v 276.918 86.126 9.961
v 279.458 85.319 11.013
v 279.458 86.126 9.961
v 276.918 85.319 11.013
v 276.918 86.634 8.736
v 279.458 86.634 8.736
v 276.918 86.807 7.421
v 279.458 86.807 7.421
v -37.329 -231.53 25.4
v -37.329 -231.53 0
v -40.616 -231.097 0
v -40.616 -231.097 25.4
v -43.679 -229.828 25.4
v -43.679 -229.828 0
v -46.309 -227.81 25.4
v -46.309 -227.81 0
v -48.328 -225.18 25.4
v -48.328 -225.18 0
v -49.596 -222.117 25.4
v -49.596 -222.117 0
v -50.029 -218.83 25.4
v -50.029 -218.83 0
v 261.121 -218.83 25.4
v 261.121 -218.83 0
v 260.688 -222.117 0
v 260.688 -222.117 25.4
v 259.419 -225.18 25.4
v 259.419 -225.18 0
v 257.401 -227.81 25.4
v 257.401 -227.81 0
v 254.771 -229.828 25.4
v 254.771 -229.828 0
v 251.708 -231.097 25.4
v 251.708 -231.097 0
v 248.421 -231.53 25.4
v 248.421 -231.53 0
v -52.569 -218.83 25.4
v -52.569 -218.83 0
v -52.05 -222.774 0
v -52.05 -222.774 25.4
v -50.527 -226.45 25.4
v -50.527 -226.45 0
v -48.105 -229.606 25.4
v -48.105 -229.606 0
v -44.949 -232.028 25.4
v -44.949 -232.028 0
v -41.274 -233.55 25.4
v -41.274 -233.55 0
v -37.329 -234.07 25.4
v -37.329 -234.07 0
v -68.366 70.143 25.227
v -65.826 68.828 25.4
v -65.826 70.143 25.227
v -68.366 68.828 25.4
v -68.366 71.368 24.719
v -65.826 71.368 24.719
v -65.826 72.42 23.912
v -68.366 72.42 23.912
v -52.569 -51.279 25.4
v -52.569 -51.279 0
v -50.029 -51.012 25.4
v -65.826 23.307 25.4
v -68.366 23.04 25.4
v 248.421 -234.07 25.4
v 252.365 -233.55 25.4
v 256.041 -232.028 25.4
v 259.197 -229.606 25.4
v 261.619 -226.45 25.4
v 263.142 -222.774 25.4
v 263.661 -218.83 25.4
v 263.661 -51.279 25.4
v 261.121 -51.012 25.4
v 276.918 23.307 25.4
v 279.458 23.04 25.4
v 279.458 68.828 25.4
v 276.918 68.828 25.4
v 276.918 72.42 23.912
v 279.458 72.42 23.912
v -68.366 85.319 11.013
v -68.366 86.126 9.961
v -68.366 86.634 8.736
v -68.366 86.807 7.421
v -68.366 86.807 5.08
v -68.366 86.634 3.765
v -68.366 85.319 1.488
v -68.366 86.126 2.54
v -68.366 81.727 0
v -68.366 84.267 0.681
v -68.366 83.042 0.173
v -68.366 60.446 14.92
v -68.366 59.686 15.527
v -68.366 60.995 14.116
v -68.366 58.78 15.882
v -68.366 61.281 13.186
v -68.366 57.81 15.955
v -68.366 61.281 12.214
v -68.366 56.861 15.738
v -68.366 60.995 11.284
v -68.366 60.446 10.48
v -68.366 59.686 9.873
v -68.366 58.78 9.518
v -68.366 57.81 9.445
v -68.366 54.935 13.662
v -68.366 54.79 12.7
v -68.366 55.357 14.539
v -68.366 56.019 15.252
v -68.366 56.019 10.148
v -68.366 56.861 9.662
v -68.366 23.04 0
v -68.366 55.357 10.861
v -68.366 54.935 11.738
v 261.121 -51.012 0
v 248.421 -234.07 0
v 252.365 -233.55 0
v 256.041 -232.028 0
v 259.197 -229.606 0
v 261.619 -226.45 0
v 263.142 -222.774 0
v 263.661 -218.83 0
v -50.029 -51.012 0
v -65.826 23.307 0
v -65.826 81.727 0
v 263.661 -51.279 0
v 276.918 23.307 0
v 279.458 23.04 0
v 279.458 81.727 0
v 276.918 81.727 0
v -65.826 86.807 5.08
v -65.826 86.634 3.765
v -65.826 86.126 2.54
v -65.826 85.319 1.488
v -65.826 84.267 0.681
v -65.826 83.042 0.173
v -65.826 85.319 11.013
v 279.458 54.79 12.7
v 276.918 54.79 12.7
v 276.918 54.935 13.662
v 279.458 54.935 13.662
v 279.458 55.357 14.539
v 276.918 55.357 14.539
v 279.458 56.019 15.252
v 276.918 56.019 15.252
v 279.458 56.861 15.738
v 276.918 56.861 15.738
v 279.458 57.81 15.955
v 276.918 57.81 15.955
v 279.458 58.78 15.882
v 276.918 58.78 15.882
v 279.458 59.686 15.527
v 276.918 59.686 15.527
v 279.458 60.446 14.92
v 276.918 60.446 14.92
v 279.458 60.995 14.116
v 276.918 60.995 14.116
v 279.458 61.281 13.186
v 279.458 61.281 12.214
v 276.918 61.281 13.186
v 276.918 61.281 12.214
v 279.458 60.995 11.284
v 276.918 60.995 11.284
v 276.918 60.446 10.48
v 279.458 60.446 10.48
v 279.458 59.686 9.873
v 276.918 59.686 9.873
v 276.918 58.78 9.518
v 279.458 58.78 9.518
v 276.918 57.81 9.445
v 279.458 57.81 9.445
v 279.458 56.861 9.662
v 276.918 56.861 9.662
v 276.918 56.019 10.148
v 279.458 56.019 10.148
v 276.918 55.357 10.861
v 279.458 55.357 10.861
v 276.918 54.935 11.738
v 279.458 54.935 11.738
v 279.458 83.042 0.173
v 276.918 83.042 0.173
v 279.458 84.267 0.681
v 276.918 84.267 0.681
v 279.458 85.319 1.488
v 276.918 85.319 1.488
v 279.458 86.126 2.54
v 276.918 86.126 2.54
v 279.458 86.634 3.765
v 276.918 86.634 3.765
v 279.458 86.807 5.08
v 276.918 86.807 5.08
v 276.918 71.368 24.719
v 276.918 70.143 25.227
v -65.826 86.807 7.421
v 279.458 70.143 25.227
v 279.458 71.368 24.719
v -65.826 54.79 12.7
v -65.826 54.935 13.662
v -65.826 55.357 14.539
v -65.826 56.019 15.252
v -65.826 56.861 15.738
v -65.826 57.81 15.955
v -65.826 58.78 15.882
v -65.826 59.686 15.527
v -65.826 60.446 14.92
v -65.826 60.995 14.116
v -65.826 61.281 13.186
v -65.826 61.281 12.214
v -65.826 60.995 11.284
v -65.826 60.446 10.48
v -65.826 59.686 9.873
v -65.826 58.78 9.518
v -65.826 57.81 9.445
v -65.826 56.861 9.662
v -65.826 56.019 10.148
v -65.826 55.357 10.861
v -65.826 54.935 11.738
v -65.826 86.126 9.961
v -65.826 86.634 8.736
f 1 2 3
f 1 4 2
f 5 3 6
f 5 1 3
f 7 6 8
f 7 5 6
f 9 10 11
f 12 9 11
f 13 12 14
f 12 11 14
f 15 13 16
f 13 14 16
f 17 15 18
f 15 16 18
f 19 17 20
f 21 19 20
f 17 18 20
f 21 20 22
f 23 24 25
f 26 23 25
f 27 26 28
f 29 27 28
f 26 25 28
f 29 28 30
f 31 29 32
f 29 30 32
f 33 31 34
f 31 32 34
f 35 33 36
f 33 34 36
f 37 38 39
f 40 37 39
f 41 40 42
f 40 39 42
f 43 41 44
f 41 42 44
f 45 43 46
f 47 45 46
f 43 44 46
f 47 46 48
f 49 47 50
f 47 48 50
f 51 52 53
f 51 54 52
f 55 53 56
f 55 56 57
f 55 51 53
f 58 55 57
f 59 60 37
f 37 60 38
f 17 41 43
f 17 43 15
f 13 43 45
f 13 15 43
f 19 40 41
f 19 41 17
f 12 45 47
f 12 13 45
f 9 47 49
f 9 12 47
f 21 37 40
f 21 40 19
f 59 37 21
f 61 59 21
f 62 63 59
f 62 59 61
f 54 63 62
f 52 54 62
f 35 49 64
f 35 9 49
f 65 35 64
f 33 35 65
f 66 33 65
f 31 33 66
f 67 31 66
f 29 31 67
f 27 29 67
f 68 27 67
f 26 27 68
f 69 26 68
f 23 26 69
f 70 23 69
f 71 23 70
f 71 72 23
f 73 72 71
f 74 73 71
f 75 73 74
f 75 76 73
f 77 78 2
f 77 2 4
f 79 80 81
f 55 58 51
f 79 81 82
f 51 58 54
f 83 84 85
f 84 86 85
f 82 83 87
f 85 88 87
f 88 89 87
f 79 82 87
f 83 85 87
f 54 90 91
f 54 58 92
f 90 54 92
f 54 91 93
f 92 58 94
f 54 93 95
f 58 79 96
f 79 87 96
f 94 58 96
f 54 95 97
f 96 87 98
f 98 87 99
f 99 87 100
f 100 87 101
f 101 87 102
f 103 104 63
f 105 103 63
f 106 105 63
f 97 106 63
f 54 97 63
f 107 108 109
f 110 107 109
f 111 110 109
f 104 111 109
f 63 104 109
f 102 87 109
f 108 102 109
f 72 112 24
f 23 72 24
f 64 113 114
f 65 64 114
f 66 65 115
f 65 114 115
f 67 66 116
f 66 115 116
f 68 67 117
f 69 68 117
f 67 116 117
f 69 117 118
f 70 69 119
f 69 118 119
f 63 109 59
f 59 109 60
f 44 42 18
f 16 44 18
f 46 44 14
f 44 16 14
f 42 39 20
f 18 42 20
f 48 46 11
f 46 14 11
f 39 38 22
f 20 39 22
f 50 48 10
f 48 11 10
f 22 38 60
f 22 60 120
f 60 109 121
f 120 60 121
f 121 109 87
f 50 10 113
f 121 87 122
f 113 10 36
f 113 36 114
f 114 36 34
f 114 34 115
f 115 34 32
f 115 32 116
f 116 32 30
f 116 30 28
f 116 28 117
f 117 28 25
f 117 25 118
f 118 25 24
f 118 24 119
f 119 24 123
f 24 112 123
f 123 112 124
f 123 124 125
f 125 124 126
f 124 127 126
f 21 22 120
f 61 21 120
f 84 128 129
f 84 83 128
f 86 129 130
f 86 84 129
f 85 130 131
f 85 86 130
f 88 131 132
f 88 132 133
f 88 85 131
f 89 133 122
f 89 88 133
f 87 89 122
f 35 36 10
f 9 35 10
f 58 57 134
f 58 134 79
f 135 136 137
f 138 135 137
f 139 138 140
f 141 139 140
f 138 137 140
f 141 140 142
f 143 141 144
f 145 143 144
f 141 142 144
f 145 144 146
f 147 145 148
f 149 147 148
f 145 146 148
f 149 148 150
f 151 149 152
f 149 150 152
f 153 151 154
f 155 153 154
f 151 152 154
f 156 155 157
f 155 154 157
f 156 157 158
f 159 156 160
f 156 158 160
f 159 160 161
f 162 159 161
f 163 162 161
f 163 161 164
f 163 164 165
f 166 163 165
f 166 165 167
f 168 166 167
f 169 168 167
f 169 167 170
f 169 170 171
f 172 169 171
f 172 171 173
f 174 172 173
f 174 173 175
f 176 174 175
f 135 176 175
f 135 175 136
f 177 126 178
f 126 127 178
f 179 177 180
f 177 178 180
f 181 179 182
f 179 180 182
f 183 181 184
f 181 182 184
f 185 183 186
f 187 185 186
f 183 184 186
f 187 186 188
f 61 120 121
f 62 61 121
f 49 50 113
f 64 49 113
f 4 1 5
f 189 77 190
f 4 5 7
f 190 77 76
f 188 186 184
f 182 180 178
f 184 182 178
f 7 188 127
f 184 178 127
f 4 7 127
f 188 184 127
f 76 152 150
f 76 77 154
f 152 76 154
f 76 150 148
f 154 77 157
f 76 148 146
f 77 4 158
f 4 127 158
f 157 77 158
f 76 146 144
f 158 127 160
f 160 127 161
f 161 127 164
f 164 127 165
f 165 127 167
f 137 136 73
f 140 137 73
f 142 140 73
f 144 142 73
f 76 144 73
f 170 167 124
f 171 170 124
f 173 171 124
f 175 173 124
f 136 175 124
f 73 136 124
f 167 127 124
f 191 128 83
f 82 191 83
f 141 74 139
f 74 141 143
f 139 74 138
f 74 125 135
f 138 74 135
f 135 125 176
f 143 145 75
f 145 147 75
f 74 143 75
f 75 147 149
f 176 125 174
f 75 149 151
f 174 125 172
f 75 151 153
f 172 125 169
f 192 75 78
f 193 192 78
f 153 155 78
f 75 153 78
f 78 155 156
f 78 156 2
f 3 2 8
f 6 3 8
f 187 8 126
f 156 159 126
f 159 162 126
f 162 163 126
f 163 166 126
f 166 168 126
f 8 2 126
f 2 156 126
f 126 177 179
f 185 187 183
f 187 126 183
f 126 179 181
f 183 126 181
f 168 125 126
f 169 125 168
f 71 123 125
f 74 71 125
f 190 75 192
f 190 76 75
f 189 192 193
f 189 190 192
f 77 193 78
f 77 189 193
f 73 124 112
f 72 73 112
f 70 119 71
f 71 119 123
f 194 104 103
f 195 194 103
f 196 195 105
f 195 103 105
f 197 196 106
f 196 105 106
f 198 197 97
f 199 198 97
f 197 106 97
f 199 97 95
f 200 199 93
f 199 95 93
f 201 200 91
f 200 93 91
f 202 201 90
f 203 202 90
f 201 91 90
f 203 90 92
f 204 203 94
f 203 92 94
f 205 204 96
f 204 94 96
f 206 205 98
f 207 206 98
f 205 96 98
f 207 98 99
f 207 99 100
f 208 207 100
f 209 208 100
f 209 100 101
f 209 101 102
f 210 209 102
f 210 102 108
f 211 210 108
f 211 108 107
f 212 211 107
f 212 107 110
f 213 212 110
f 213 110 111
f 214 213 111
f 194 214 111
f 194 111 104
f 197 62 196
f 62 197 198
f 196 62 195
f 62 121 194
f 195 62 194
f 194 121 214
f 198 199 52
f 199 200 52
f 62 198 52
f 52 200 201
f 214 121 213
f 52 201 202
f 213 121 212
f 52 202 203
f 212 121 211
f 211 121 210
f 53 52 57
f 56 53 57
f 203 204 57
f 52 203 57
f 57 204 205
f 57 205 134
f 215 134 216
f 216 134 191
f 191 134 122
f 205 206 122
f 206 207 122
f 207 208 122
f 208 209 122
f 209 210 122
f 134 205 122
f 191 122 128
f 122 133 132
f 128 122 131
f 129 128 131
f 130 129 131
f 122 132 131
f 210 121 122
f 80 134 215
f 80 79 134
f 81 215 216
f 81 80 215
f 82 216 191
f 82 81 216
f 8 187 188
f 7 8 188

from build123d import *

# Parameters (mm, degrees)
F1_DEPTH = 25.4
F3_D     = 6.5278
F4_SIZE2 = 15.875
F4_SIZE  = 15.875
F5_R     = 5.08


with BuildPart() as f1:
    # F0 (on Top) → F1 (new body)
    with BuildSketch(Plane.XY):
        with BuildLine():
            Line((-65.826073072, 23.3069159811), (-65.826073072, 86.8069159811))
            Line((-65.826073072, 86.8069159811), (-68.366073072, 86.8069159811))
            Line((-68.366073072, 86.8069159811), (-68.366073072, 23.0399512236))
            Line((-68.366073072, 23.0399512236), (-52.5691465571, -51.2787448955))
            Line((-52.5691465571, -51.2787448955), (-52.5691465571, -218.829580138))
            ThreePointArc((-52.5691465571, -218.829580138), (-48.1054539024, -229.6058874832), (-37.3291465571, -234.069580138))
            Line((-37.3291465571, -234.069580138), (248.4208534429, -234.069580138))
            ThreePointArc((248.4208534429, -234.069580138), (259.1971607882, -229.6058874832), (263.6608534429, -218.829580138))
            Line((263.6608534429, -218.829580138), (263.6608534429, -51.2787448955))
            Line((263.6608534429, -51.2787448955), (279.4577799578, 23.0399512236))
            Line((279.4577799578, 23.0399512236), (279.4577799578, 86.8069159811))
            Line((279.4577799578, 86.8069159811), (276.9177799578, 86.8069159811))
            Line((276.9177799578, 86.8069159811), (276.9177799578, 23.3069159811))
            Line((276.9177799578, 23.3069159811), (261.1208534429, -51.011780138))
            Line((261.1208534429, -51.011780138), (261.1208534429, -218.829580138))
            ThreePointArc((261.1208534429, -218.829580138), (257.401109564, -227.809836259), (248.4208534429, -231.529580138))
            Line((248.4208534429, -231.529580138), (-37.3291465571, -231.529580138))
            ThreePointArc((-37.3291465571, -231.529580138), (-46.3094026781, -227.809836259), (-50.0291465571, -218.829580138))
            Line((-50.0291465571, -218.829580138), (-50.0291465571, -51.011780138))
            Line((-50.0291465571, -51.011780138), (-65.826073072, 23.3069159811))
        make_face()
    extrude(amount=F1_DEPTH)

    # F3 (through all)
    with Locations(Plane.YZ.offset(279.4577799578)):
        with Locations((58.0538512236, 12.7)):
            Hole(F3_D / 2)

    # F4
    f4_edges = [f1.edges().sort_by_distance(p)[0] for p in [
        (278.18778, 86.806916, 25.4),
        (-67.096073, 86.806916, 25.4),
    ]]
    chamfer(f4_edges, length=F4_SIZE, length2=F4_SIZE2)

    # F5
    f5_edges = [f1.edges().sort_by_distance(p)[0] for p in [
        (-67.096073, 70.931916, 25.4),
        (278.18778, 70.931916, 25.4),
        (278.18778, 86.806916, 9.525),
        (-67.096073, 86.806916, 9.525),
        (-67.096073, 86.806916, 0),
        (278.18778, 86.806916, 0),
    ]]
    fillet(f5_edges, radius=F5_R)


solid = f1.part
